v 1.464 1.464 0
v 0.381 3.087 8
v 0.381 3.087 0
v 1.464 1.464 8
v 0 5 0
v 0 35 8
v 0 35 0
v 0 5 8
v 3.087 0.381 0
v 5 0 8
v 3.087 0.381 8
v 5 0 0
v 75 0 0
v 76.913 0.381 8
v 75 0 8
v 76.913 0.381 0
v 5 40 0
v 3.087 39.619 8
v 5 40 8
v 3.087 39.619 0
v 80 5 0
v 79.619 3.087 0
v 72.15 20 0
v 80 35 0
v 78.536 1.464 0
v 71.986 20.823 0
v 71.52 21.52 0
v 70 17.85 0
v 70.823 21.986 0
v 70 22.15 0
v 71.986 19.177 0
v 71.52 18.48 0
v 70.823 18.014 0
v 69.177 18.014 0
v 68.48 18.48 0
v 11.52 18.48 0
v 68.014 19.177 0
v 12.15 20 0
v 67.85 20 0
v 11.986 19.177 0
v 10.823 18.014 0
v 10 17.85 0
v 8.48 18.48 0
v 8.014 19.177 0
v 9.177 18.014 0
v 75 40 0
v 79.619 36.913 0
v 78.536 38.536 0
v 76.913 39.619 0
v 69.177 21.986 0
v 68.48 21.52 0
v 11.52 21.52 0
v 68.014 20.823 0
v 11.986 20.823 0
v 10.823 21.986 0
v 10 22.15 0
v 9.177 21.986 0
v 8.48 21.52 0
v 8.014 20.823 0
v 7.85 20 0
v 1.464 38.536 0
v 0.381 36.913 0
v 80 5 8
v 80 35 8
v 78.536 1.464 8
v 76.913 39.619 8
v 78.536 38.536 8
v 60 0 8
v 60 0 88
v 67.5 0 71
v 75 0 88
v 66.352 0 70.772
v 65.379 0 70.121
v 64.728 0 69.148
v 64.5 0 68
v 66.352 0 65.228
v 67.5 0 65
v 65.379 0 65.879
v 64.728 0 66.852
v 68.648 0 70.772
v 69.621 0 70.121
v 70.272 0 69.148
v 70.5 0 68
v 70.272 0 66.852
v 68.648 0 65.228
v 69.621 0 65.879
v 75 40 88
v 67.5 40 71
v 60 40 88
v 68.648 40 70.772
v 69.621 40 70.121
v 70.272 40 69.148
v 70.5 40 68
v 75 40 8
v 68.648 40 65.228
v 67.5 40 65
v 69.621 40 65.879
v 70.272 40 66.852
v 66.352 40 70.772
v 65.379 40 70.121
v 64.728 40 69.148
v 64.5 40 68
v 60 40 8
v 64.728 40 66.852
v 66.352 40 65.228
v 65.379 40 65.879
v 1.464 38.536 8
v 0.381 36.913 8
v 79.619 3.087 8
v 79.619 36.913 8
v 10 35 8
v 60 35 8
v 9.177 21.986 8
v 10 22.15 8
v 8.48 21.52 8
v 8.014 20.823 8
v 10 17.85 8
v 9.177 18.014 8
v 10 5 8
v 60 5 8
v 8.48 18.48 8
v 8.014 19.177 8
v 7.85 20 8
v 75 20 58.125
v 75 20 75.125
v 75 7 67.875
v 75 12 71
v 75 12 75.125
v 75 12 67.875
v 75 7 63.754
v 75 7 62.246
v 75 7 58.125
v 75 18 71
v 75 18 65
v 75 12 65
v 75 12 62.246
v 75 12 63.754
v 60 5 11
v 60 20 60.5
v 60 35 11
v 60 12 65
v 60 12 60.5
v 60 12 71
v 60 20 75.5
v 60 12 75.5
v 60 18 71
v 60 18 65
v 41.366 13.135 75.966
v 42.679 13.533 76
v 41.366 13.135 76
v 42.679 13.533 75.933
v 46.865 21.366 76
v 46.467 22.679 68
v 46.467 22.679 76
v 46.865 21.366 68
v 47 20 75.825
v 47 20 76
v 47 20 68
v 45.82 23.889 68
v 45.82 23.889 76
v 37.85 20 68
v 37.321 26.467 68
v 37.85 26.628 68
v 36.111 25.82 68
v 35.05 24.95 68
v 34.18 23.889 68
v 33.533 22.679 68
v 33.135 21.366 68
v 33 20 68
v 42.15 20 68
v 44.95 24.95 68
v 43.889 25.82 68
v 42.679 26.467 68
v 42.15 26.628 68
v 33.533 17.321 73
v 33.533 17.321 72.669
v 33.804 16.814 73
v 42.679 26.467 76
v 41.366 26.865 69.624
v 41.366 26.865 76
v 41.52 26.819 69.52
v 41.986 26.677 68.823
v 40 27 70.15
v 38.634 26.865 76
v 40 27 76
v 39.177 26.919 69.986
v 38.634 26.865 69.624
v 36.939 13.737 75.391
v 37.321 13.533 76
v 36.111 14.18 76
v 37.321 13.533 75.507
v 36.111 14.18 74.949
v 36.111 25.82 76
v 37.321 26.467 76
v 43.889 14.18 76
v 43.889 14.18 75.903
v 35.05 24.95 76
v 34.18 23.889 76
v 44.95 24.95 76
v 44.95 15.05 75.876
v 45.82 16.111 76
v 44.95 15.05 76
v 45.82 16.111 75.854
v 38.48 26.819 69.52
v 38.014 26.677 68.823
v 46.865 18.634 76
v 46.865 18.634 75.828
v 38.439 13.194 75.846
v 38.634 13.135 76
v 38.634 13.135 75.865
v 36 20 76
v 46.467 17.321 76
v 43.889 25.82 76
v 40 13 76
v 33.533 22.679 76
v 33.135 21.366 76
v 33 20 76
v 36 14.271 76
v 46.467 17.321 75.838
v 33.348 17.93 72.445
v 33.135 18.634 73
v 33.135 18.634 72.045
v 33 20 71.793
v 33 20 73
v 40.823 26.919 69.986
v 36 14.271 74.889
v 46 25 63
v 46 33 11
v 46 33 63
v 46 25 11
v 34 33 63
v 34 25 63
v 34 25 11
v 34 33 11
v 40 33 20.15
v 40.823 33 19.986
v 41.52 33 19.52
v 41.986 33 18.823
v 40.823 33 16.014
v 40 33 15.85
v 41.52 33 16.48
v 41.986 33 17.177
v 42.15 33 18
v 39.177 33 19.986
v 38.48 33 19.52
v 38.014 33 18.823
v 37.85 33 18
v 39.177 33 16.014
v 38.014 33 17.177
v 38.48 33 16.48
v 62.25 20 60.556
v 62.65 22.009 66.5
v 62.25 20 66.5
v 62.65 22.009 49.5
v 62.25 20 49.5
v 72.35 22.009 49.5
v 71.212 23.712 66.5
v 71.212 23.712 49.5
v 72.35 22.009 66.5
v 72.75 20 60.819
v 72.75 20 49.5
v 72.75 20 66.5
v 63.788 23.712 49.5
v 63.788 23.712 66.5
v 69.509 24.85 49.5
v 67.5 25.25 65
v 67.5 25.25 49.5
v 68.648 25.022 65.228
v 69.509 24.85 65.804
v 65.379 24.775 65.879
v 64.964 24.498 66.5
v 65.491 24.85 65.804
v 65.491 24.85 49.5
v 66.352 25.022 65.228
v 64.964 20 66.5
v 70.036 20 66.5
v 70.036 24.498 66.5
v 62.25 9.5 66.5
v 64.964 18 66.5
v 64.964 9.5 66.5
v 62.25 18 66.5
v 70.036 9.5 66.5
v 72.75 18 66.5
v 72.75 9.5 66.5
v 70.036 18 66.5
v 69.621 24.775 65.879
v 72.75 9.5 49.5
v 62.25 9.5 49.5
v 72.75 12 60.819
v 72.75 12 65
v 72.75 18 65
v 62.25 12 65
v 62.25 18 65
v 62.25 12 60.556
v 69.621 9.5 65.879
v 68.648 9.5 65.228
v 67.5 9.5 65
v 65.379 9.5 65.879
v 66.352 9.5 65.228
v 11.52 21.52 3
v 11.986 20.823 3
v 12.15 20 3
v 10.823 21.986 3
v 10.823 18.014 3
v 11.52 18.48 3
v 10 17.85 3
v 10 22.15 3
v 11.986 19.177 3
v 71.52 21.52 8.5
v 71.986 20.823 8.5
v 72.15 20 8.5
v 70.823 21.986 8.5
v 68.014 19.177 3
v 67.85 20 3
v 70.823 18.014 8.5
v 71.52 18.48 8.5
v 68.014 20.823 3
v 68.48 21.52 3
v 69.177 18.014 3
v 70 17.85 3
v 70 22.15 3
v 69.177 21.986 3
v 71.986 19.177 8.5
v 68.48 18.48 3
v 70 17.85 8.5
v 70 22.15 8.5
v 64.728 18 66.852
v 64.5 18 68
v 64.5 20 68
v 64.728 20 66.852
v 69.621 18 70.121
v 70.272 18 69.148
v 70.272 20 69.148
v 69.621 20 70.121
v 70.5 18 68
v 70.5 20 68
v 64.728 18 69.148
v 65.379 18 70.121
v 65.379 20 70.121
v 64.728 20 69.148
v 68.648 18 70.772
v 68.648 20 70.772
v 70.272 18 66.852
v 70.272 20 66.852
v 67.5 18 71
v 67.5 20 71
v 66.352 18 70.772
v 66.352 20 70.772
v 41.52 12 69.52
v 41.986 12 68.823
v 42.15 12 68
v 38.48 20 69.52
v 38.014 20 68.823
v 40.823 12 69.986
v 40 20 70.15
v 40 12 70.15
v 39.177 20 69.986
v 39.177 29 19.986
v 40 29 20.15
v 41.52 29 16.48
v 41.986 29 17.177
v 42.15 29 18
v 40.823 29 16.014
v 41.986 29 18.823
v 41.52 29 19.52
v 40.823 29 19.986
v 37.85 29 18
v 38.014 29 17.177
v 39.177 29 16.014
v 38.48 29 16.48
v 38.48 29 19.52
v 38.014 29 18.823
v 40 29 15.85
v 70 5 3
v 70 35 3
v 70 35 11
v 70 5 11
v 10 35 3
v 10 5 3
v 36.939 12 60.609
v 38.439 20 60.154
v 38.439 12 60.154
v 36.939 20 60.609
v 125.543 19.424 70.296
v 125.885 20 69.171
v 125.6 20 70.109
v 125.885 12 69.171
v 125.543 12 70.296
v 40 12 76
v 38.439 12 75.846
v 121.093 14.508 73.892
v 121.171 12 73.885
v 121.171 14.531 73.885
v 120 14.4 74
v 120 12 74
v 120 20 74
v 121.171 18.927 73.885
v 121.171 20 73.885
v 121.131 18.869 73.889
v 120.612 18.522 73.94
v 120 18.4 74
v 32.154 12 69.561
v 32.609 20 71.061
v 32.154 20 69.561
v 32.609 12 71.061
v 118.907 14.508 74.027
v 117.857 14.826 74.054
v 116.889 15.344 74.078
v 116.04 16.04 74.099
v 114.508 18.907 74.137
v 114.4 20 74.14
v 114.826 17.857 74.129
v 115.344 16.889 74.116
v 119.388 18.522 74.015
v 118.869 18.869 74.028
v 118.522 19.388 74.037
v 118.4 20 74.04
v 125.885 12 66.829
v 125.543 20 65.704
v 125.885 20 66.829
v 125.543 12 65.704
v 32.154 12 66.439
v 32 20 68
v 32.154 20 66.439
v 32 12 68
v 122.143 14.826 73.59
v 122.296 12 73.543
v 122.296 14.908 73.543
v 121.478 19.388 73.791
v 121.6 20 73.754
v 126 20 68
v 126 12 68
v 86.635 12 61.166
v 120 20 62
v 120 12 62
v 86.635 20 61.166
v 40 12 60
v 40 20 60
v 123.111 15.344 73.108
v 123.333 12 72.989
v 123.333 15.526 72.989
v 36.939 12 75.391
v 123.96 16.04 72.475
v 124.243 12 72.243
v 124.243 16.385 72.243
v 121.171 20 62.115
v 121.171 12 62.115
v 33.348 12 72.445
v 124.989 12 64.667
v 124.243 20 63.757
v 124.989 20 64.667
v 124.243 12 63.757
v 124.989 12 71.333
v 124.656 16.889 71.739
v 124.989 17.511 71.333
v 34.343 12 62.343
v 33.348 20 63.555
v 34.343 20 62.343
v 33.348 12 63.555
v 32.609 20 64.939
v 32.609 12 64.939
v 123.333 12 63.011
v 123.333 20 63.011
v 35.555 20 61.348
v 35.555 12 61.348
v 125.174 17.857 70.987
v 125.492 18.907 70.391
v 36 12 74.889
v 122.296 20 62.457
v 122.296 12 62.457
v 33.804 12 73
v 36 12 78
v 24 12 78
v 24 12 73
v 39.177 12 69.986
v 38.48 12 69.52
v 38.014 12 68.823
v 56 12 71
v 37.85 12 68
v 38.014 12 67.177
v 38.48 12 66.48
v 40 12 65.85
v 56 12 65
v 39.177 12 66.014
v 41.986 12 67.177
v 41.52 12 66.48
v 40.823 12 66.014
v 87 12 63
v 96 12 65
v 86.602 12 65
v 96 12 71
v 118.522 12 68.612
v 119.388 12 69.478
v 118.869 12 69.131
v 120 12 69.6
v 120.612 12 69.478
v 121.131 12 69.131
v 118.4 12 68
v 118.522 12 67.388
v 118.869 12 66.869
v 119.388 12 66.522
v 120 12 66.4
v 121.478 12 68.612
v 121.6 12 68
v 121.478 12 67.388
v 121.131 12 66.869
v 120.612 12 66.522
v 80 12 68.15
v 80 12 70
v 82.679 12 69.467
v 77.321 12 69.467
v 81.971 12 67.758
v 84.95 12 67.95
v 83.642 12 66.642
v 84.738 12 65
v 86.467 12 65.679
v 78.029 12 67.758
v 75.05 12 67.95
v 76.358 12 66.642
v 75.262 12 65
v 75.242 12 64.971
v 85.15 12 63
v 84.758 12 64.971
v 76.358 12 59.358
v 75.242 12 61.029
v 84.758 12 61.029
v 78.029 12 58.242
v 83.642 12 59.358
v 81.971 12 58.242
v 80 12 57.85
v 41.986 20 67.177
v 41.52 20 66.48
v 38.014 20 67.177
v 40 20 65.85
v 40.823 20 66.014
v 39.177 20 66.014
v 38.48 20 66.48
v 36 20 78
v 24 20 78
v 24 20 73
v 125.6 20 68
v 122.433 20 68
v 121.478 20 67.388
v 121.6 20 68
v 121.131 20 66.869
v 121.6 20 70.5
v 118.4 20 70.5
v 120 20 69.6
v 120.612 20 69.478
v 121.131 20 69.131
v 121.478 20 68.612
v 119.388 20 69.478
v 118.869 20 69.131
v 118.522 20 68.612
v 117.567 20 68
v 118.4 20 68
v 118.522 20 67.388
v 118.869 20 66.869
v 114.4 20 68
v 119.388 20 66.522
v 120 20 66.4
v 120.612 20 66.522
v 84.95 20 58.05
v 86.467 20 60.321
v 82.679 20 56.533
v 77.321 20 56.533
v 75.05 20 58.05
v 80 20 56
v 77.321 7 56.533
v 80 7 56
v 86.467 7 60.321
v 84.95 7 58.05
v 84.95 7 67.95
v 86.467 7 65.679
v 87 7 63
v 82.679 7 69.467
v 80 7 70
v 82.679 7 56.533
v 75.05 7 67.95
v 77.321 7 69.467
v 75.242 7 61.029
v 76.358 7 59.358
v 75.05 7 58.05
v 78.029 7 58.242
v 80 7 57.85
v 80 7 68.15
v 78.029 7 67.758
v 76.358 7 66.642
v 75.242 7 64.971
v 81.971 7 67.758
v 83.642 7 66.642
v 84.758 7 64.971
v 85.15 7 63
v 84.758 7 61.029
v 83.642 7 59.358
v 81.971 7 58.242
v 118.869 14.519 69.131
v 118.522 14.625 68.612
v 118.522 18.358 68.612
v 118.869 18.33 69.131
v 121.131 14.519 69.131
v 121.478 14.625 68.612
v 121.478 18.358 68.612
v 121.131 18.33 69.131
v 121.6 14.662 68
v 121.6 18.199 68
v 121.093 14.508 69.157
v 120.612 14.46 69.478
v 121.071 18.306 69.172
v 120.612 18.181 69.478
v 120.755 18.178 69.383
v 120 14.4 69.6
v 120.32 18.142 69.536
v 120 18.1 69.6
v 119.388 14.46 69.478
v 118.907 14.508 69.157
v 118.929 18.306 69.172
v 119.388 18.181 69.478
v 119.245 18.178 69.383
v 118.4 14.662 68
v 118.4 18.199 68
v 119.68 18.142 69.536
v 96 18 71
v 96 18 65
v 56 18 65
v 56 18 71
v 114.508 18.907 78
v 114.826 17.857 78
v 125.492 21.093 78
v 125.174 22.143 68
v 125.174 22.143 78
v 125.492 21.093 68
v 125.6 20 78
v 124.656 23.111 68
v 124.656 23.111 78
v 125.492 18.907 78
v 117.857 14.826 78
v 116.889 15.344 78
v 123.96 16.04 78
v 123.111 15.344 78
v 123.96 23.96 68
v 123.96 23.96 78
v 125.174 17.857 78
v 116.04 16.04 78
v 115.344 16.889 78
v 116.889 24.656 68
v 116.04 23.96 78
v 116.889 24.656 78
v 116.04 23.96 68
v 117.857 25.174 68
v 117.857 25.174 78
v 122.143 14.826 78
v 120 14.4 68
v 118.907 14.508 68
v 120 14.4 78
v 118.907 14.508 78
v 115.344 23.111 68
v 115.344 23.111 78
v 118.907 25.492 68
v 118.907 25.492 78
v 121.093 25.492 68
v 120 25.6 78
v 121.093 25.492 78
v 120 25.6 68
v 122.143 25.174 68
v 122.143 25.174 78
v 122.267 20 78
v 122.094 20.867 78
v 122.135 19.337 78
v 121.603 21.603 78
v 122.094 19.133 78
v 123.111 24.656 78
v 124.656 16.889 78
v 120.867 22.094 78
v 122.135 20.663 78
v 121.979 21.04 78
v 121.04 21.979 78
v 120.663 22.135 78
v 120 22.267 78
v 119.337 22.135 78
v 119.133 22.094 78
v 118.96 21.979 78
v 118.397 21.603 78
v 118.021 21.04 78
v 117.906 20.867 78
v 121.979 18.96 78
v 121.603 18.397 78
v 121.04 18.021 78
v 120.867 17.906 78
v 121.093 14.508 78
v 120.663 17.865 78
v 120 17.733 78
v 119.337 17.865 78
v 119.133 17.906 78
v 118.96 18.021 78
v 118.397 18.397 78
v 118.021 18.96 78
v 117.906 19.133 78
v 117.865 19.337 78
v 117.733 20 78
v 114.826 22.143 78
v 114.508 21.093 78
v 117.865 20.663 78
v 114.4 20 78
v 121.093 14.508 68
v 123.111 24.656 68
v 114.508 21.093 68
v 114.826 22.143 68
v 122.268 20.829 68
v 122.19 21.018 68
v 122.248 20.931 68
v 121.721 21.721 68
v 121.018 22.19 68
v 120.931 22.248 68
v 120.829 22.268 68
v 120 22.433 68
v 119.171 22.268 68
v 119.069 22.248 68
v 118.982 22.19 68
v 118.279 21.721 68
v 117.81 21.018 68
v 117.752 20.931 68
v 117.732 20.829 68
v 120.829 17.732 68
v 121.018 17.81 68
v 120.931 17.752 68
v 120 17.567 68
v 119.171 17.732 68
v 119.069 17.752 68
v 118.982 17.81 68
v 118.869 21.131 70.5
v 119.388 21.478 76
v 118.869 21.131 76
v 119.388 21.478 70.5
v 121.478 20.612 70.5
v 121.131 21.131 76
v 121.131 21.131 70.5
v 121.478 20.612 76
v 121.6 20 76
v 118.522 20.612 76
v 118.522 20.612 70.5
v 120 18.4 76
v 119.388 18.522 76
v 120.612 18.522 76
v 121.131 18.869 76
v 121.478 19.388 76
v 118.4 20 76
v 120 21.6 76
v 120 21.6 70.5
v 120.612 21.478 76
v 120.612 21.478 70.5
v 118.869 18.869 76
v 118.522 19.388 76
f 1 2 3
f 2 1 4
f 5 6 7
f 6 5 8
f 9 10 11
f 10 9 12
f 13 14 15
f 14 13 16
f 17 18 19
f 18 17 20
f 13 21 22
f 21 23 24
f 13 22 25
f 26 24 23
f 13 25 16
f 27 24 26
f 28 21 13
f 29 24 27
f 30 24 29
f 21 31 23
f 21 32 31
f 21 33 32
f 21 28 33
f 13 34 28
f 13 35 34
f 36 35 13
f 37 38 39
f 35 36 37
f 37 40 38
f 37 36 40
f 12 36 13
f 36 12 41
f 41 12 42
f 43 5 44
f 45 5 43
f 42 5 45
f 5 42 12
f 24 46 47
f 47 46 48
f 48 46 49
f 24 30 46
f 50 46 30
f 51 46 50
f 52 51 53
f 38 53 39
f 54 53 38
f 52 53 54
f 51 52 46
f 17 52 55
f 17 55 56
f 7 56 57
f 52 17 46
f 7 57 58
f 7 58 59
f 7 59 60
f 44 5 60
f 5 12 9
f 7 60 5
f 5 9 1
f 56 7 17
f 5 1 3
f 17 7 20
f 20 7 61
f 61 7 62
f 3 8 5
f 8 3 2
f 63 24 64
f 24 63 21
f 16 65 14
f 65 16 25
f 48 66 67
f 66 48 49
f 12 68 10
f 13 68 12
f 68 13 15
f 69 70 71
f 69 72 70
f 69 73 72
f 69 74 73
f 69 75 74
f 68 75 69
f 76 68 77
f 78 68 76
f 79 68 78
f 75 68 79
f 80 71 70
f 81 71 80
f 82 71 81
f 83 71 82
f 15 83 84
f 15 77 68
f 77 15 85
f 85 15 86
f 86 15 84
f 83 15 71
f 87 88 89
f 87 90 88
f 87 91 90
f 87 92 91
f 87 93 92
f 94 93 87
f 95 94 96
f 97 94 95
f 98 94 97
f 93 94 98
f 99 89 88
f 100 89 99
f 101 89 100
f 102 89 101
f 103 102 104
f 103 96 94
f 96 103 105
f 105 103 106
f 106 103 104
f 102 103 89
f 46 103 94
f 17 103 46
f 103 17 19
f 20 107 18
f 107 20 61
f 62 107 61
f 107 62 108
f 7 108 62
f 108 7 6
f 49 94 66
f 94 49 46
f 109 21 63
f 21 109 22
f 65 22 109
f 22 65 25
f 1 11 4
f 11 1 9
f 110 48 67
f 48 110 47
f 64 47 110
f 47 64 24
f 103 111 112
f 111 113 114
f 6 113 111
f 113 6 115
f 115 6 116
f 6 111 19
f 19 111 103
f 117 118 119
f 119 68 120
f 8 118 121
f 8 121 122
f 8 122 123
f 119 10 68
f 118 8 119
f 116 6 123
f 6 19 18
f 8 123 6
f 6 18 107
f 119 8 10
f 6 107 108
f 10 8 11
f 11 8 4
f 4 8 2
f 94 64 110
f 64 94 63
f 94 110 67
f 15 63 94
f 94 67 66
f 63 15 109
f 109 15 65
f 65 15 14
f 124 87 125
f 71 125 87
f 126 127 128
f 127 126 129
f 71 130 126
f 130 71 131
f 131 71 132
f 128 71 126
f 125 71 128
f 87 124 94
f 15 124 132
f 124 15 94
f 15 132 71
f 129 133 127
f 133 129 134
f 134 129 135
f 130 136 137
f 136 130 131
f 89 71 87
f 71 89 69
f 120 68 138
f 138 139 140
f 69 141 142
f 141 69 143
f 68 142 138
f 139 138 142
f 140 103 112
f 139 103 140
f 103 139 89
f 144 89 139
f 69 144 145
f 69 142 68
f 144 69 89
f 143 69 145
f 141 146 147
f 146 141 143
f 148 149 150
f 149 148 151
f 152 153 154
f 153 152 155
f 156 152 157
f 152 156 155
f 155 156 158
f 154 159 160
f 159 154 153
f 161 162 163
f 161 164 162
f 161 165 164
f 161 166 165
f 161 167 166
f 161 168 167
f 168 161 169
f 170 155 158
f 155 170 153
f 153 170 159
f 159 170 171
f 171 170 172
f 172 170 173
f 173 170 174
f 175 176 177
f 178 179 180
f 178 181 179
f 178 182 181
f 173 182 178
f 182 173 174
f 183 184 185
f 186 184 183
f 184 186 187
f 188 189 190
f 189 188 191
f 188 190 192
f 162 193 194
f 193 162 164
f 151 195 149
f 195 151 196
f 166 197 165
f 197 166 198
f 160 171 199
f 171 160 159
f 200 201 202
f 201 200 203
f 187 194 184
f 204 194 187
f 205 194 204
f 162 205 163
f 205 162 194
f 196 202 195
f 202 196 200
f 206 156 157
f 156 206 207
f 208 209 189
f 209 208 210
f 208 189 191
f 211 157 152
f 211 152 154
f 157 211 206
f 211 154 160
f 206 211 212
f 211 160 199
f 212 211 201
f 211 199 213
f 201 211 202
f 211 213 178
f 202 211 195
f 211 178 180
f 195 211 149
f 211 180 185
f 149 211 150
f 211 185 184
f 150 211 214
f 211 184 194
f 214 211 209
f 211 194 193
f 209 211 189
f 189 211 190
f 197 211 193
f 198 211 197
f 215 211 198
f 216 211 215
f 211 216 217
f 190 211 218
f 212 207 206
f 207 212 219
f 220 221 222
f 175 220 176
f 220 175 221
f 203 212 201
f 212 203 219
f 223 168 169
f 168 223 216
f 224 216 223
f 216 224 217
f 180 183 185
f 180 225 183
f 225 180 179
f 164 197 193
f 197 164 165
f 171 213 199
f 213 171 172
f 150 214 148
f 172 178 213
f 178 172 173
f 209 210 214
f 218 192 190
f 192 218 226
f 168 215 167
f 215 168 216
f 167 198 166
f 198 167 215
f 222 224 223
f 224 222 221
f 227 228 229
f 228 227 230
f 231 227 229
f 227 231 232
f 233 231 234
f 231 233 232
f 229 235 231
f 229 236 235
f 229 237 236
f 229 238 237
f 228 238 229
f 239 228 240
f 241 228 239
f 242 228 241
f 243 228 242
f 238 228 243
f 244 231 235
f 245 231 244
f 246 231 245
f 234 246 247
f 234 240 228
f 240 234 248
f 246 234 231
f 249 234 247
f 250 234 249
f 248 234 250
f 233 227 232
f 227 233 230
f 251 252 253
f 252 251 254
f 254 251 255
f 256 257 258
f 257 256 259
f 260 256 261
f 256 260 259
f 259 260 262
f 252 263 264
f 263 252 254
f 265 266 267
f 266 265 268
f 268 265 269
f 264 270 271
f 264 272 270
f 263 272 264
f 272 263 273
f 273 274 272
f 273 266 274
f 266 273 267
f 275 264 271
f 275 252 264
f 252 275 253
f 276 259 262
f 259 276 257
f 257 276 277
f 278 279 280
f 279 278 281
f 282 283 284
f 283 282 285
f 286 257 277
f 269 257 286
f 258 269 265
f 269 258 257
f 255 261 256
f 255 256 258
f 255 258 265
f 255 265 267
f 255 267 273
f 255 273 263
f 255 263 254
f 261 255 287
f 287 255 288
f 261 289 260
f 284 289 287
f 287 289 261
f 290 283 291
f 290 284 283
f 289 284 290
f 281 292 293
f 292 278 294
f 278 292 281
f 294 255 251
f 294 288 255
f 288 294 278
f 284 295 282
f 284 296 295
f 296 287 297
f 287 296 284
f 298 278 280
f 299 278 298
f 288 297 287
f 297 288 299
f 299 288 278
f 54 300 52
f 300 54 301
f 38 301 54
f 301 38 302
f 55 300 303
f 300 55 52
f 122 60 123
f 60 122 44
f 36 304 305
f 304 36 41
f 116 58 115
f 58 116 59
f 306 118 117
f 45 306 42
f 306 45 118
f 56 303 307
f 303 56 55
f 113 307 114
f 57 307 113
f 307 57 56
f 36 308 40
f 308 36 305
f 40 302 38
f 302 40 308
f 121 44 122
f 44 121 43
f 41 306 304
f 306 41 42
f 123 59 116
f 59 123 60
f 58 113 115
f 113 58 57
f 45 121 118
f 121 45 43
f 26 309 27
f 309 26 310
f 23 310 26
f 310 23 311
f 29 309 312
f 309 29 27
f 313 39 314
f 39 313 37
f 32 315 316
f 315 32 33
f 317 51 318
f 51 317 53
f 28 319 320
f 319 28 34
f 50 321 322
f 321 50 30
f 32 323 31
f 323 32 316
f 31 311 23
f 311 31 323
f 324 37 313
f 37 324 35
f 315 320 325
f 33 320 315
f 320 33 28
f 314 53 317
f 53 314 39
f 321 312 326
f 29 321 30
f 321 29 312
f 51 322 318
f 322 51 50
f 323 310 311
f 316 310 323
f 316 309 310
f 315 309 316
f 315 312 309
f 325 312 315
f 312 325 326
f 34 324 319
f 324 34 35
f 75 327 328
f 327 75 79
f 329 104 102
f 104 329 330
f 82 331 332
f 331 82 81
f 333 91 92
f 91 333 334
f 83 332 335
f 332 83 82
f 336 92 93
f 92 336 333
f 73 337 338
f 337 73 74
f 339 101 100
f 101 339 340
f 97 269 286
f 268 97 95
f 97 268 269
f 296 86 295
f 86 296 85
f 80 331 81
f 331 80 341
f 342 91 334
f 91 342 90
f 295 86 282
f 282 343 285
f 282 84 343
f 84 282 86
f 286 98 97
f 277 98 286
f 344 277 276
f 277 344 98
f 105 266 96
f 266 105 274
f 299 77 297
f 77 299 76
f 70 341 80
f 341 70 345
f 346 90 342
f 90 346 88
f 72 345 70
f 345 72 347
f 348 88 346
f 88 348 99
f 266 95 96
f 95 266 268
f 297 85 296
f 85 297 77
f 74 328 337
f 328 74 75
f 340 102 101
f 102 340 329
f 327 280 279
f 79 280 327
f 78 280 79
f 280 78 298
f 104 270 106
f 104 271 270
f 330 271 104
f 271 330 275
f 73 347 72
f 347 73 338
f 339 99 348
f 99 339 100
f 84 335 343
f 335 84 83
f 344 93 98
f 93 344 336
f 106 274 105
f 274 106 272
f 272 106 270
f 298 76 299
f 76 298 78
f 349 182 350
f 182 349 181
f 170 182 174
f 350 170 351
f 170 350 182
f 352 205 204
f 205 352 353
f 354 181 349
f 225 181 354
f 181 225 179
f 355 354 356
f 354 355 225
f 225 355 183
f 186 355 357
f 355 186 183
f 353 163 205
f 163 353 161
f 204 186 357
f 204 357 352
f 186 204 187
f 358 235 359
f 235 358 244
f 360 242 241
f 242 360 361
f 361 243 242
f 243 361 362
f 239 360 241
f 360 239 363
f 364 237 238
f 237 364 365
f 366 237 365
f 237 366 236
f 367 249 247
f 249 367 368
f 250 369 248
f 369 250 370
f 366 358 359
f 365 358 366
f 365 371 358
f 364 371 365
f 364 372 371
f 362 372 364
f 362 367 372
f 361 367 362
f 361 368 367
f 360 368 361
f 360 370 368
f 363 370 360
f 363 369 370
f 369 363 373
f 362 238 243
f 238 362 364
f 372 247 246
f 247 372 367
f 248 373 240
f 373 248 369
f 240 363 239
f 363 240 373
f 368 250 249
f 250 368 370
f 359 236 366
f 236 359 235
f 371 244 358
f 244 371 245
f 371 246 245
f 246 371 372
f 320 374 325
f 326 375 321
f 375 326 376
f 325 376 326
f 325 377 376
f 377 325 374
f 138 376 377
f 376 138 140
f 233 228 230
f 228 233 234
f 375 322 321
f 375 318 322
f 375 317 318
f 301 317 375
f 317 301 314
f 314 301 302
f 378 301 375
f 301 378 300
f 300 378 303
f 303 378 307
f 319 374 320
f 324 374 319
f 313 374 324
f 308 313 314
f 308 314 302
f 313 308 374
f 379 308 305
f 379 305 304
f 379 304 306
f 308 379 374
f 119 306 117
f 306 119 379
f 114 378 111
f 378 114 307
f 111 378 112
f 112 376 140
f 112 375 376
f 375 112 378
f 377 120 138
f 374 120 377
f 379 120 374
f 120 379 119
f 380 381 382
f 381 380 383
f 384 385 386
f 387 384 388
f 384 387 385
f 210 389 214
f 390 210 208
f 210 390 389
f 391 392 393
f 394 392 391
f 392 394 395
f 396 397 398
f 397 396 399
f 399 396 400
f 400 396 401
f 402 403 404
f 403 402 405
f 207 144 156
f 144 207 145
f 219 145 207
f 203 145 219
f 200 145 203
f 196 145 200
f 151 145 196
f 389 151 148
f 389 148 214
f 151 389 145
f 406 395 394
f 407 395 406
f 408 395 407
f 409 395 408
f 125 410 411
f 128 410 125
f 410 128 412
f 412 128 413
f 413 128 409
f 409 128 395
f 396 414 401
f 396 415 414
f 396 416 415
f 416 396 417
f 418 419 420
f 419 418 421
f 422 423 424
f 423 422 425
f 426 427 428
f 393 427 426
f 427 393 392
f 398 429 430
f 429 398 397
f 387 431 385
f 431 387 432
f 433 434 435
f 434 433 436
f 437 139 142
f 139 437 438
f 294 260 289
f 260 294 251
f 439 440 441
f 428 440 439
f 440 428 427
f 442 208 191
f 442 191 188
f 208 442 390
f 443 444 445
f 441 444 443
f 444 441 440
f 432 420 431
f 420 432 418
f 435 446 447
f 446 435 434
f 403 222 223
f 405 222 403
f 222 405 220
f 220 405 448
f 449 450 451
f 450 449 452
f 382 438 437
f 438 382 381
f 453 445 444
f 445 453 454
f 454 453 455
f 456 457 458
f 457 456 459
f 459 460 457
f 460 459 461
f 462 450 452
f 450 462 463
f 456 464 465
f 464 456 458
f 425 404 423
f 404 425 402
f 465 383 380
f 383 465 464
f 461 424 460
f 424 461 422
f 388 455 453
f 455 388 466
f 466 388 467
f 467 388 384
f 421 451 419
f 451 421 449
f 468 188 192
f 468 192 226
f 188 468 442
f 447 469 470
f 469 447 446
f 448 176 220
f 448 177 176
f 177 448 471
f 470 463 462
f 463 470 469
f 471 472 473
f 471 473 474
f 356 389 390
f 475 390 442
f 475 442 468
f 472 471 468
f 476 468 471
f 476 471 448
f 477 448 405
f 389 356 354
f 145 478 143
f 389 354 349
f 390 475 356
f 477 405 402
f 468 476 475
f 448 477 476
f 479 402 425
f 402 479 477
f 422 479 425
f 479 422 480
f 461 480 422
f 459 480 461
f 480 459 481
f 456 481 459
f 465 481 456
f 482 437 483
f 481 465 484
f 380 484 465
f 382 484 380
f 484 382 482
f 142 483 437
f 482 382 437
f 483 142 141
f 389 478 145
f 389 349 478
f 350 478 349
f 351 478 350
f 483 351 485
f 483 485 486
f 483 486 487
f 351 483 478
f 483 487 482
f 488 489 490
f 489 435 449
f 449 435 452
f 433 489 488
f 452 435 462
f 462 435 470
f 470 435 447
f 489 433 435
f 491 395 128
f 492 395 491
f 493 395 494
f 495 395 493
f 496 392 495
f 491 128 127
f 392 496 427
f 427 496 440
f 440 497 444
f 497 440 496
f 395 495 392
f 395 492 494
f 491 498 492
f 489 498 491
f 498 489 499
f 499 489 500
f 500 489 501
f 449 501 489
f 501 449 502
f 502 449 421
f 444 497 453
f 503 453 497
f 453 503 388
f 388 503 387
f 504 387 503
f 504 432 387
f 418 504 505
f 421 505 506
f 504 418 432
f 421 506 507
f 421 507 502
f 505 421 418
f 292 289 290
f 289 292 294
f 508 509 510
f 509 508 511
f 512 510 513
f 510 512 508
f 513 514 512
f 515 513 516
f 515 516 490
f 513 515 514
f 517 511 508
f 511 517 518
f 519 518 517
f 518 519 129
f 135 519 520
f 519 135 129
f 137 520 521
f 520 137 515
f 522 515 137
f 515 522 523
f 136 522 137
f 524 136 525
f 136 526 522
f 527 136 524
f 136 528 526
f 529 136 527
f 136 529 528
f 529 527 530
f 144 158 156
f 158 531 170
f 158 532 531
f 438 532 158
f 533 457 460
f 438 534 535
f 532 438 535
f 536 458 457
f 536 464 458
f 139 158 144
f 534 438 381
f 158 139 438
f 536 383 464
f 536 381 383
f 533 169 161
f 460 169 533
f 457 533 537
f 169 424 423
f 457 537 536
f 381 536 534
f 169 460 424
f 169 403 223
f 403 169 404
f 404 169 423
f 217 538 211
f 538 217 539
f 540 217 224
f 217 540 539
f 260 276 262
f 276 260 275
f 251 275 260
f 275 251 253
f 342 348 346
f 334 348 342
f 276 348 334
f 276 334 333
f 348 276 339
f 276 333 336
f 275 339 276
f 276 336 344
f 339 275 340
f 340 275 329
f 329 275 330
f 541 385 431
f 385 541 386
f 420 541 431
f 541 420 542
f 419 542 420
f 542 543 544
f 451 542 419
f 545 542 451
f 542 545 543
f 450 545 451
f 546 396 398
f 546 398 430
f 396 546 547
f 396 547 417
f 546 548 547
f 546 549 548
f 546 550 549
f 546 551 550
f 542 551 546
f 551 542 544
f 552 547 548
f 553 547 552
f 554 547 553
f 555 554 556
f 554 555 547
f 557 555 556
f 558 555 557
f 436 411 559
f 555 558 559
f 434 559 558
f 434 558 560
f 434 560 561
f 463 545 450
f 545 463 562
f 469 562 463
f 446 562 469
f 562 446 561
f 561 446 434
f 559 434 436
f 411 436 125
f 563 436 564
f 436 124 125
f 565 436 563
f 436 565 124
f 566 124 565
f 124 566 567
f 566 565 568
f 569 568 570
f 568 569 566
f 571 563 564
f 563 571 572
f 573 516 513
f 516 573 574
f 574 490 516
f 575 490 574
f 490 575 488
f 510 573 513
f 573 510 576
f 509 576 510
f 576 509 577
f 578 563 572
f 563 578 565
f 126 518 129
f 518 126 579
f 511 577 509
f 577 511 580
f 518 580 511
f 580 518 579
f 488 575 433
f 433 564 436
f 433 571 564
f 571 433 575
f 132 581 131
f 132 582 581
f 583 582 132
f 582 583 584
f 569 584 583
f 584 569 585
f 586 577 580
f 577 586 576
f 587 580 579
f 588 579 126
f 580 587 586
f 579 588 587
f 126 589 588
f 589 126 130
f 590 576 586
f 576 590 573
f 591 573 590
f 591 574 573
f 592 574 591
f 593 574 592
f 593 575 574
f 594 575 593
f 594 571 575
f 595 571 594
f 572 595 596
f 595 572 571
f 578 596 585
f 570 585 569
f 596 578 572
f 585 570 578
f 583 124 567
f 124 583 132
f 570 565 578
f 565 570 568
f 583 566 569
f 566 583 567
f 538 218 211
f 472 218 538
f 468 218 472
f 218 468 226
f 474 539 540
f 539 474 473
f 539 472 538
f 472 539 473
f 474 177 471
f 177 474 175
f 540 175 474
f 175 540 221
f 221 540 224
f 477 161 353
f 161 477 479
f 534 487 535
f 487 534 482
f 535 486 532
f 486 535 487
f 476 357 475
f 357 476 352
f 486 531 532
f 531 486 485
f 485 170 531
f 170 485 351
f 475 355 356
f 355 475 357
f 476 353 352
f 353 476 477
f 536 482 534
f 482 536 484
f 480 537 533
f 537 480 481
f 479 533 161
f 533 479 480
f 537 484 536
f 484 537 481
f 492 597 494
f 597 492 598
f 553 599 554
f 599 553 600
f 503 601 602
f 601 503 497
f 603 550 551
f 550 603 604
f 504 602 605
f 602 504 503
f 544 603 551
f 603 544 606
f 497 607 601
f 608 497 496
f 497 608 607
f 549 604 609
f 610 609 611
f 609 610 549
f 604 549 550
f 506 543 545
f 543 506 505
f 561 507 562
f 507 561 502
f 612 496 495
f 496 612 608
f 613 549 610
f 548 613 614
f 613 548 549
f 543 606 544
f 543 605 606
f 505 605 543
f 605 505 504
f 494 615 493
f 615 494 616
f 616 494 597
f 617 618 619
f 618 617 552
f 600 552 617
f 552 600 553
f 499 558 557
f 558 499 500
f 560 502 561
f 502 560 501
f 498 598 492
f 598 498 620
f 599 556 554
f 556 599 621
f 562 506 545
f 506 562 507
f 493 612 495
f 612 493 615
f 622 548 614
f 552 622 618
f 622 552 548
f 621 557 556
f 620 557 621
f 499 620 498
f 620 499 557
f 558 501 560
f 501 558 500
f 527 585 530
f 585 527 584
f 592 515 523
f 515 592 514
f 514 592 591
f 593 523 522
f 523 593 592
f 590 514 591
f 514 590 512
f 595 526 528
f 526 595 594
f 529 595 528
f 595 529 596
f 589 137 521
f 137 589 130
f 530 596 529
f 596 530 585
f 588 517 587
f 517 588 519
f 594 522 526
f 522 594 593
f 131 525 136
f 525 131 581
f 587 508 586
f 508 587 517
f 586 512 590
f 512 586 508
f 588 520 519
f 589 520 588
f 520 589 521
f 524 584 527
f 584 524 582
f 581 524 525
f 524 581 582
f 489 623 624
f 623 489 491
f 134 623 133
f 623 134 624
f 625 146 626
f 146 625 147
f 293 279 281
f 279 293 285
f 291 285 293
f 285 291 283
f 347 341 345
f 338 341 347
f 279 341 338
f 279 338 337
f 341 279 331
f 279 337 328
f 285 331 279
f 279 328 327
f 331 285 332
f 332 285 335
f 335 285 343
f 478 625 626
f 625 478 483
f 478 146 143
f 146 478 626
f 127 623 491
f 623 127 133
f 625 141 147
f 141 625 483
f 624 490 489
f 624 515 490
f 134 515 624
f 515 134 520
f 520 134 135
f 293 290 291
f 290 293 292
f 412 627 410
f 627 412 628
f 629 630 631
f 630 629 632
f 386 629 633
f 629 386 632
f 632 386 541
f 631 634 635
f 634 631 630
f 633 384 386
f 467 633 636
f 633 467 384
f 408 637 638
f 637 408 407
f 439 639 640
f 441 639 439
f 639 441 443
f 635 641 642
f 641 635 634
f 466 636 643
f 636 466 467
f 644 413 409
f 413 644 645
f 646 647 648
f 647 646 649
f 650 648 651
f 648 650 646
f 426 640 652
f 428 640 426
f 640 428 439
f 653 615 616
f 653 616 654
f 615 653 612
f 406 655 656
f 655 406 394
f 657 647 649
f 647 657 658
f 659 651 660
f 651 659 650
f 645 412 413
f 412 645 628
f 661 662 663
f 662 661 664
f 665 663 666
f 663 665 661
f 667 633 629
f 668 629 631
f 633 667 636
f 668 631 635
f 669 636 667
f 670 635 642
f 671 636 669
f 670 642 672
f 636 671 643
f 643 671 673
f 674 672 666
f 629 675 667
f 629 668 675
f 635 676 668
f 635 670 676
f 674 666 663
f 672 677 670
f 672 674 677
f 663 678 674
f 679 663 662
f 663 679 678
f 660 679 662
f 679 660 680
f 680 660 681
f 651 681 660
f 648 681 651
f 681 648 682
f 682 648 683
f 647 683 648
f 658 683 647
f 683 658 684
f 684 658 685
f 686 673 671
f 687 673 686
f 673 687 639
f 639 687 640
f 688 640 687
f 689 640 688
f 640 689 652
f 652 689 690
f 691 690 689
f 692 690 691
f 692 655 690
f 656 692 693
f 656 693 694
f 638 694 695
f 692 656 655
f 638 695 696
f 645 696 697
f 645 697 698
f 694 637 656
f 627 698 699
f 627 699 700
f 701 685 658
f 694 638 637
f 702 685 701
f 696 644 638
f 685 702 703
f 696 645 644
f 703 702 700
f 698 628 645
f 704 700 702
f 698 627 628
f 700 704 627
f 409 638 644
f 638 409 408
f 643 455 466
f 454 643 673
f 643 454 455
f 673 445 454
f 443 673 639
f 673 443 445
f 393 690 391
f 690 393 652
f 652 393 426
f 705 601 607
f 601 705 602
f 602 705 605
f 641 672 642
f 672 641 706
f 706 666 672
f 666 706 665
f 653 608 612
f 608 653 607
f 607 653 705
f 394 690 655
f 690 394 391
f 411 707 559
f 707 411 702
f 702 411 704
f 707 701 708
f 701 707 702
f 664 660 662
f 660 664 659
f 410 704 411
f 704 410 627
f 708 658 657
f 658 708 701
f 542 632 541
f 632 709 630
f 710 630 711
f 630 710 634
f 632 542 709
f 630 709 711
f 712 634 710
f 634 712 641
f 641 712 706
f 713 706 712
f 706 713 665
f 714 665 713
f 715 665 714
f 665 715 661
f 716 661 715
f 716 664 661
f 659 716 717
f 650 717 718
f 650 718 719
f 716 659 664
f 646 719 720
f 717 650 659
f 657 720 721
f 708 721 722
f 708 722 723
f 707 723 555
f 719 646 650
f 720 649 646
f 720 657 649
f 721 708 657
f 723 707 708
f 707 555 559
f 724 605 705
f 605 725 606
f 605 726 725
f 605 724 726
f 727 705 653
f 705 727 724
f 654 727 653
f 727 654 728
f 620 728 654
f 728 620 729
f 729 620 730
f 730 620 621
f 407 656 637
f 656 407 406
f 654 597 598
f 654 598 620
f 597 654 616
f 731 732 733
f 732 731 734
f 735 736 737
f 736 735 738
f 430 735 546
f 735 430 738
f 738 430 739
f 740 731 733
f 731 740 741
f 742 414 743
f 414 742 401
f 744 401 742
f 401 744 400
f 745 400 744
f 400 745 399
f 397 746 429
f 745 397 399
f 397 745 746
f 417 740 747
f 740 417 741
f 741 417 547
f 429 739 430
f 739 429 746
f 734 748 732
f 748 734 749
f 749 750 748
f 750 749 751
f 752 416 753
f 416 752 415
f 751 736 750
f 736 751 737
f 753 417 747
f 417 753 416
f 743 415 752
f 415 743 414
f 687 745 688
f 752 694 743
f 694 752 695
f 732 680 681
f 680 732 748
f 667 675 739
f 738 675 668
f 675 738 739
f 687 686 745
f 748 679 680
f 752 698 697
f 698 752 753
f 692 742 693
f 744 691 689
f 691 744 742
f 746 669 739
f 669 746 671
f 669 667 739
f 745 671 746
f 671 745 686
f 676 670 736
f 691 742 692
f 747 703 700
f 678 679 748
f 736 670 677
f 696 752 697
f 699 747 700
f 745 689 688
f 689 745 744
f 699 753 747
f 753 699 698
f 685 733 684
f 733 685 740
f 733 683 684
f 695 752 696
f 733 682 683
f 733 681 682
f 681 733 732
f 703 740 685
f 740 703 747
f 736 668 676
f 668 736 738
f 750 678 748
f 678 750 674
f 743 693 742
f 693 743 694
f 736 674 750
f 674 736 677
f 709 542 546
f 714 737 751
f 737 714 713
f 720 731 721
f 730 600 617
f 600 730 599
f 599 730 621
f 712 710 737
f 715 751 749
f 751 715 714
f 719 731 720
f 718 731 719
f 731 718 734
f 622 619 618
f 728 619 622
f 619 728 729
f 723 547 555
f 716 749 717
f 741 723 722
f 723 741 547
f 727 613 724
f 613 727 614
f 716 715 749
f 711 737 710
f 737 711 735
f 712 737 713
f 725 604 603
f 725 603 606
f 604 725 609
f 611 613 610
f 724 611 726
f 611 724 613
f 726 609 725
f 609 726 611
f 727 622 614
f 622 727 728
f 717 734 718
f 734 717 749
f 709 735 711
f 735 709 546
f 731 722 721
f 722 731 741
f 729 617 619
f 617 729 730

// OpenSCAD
/**
 * wire_tensioner.scad — TM-CWND-001 Rev A
 * Wire Tensioner and Feed Guide Assembly
 *
 * Maintains consistent wire tension from spool to coil former.
 * Prevents wire loops, kinks, and variable turn spacing.
 *
 * Three modules:
 *   1. tensioner_base()  — Mounts to machine frame, holds spool post + tensioner
 *   2. tensioner_arm()   — Spring-loaded lever, adjustable tension
 *   3. wire_guide_eye()  — Ceramic or PTFE guide eyelet (or print with smooth bore)
 *
 * Design philosophy:
 *   - Spring-loaded arm with adjustable preload
 *   - Wire path: spool → post guide → tensioner arm → wire guide carriage
 *   - Tension controlled by spring preload bolt
 *   - Wire break detection when arm swings to zero-tension limit
 *   - Supports AWG 10 (2.6mm) to AWG 30 (0.3mm) with appropriate eyelet size
 *
 * Print settings:
 *   Material: PETG
 *   Infill: 50%
 *   Wall: 3 perimeters
 *   Layer: 0.2mm
 *   Print envelope: 180×80×60mm (all parts fit together)
 *
 * Hardware:
 *   Spring: 10mm OD, 40mm free length, ~0.5N/mm (McMaster 9657K113 or similar)
 *   Eyelet: 3mm bore (AWG 10–16), 1.5mm bore (AWG 17–30)
 *   Pivot: M4×25mm bolt + flanged bearing F624ZZ (4mm bore, 13mm OD)
 *   Tension adjustment: M4 thumbscrew × 1
 */

// ─── Parameters ───────────────────────────────────────────────────────────────

// Base plate
base_w          = 80.0;
base_d          = 40.0;
base_h          = 8.0;
base_corner_r   = 5.0;

// Vertical post (supports spool axle + guide)
post_h          = 80.0;
post_w          = 15.0;
post_d          = base_d;
post_x          = base_w - post_w/2 - 5;

// Spool post hole (accommodates standard spool 10mm axle hole)
spool_axle_dia  = 10.5;  // 10mm axle + clearance
spool_height    = 50.0;  // Height on post where spool axle mounts

// Tensioner arm pivot
pivot_h         = 60.0;  // Height above base
pivot_x         = base_w/2;
pivot_dia       = 4.0;   // M4 pivot bolt
pivot_boss_od   = 14.0;  // Bearing/boss OD
pivot_boss_h    = 8.0;

// Tensioner arm body
arm_len         = 80.0;
arm_w           = 10.0;
arm_h           = 8.0;

// Wire eye on arm
arm_eye_x       = arm_len - 10;  // Distance from pivot to eye center
arm_eye_dia     = 3.2;           // Wire passage hole (3mm + clearance)
arm_eye_boss_od = 12.0;

// Spring seat
spring_seat_od  = 10.0;
spring_seat_d   = 5.0;   // Pocket depth
spring_x        = arm_len / 2;  // Position along arm

// Zero-tension stop (wire break detection switch contact)
stop_h          = 5.0;
stop_w          = 12.0;

// Tension adjuster (thumbscrew compresses spring)
adj_hole_dia    = 4.3;   // M4 clearance hole
adj_x           = pivot_x;
adj_base_y      = base_d - 15;

// Base mounting holes (2× M4 to machine frame)
mount_hole_dia  = 4.3;
mount_hole_sp   = base_w - 20;

// Lower wire guide (fixed post)
lower_guide_h   = post_h - 20;
lower_guide_dia = 6.0;   // Round post, smooth bore groove

// ─── Modules ──────────────────────────────────────────────────────────────────

module tensioner_base() {
    difference() {
        union() {
            // Base footprint
            hull() {
                for (x=[base_corner_r, base_w-base_corner_r])
                for (y=[base_corner_r, base_d-base_corner_r])
                    translate([x, y, 0])
                        cylinder(h=base_h, r=base_corner_r, $fn=16);
            }

            // Vertical post (back of base)
            translate([post_x-post_w/2, 0, 0])
                cube([post_w, post_d, post_h + base_h]);

            // Pivot support boss
            translate([pivot_x, base_d/2, base_h + pivot_h])
                cylinder(h=pivot_boss_h, d=pivot_boss_od, $fn=32);

            // Tension adjuster tower
            translate([adj_x-6, adj_base_y, base_h])
                cube([12, 8, pivot_h - 5]);
        }

        // Spool axle slot on vertical post (slotted for easy spool loading)
        translate([post_x, base_d/2, base_h + spool_height]) {
            cylinder(h=post_w+2, d=spool_axle_dia, $fn=16, center=true);
            // Open slot from front for easy threading
            translate([0, -spool_axle_dia/2, 0])
                cube([spool_axle_dia, spool_axle_dia, post_w+2], center=true);
        }

        // Lower wire guide hole in post
        translate([post_x, base_d/2, base_h + lower_guide_h])
            rotate([90,0,0])
                cylinder(h=post_d+1, d=lower_guide_dia, $fn=16, center=true);

        // Pivot bore
        translate([pivot_x, base_d/2, base_h + pivot_h])
        rotate([90,0,0])
            cylinder(h=base_d+1, d=pivot_dia+0.3, $fn=16, center=true);

        // Tension adjuster M4 threaded hole
        translate([adj_x, adj_base_y+4, base_h + 10])
        rotate([-90,0,0])
            cylinder(h=pivot_h, d=adj_hole_dia, $fn=16);

        // Base mounting holes
        for (x=[10, base_w-10])
            translate([x, base_d/2, -0.5])
                cylinder(h=base_h+1, d=mount_hole_dia, $fn=16);

        // Weight relief
        translate([10, 5, 3])
            cube([base_w-20, base_d-10, base_h]);
    }
}

module tensioner_arm() {
    difference() {
        union() {
            // Arm body
            hull() {
                cylinder(h=arm_h, d=pivot_boss_od+2, $fn=32);
                translate([arm_len, 0, 0])
                    cylinder(h=arm_h, d=arm_eye_boss_od, $fn=32);
            }
            // Spring seat boss
            translate([spring_x, -arm_w/2, 0])
                cylinder(h=arm_h + spring_seat_d, d=spring_seat_od+4, $fn=16);
            // Zero-tension stop tab (contacts limit switch)
            translate([-arm_len*0.2, arm_w/2, 0])
                cube([stop_w, stop_h, arm_h]);
        }
        // Pivot hole (center)
        translate([0, 0, -0.5])
            cylinder(h=arm_h+1, d=pivot_dia+0.3, $fn=16);

        // Wire eye
        translate([arm_len, 0, -0.5])
            cylinder(h=arm_h+1, d=arm_eye_dia, $fn=16);

        // Spring seat pocket
        translate([spring_x, -arm_w/2, arm_h])
            cylinder(h=spring_seat_d+0.5, d=spring_seat_od+0.3, $fn=16);

        // Material relief
        translate([arm_len*0.2, -arm_w/2+2, 2])
            cube([arm_len*0.5, arm_w-4, arm_h-2]);
    }
}

module wire_guide_eye(bore_dia=3.2) {
    // Small guide eyelet, print with smooth bore or install commercial ceramic insert
    // Can be printed in 0.1mm layers for smooth wire passage
    eye_od = bore_dia + 8.0;
    eye_h  = 10.0;
    difference() {
        cylinder(h=eye_h, d=eye_od, $fn=32);
        // Wire bore with gentle entry chamfers
        translate([0,0,-0.5])
            cylinder(h=eye_h+1, d=bore_dia, $fn=16);
        // Entry chamfer top
        translate([0,0,eye_h-2])
            cylinder(h=3, d1=bore_dia, d2=bore_dia+2, $fn=16);
        // Entry chamfer bottom
        translate([0,0,-0.5])
            cylinder(h=3, d1=bore_dia+2, d2=bore_dia, $fn=16);
    }
}

module spool_axle() {
    // Simple spool axle rod with end stop
    // 10mm OD × 100mm, with 15mm OD flange on one end
    union() {
        cylinder(h=100, d=10, $fn=16);
        translate([0,0,95]) cylinder(h=5, d=18, $fn=16);
    }
}

// ─── Render ───────────────────────────────────────────────────────────────────

$fn = 32;
print_part = "all";  // "base" | "arm" | "eye3" | "eye15" | "axle" | "all"

if (print_part == "base") {
    color("lightgray") tensioner_base();
} else if (print_part == "arm") {
    color("orange") tensioner_arm();
} else if (print_part == "eye3") {
    color("white") wire_guide_eye(3.2);
} else if (print_part == "eye15") {
    color("white") wire_guide_eye(1.6);
} else if (print_part == "axle") {
    color("lightblue") spool_axle();
} else {
    color("lightgray", 0.8) tensioner_base();
    color("orange", 0.8)
    translate([pivot_x, base_d/2, base_h + pivot_h])
    rotate([90,0,0])
        tensioner_arm();
    color("white")
    translate([pivot_x + arm_len, base_d/2, base_h + pivot_h])
        wire_guide_eye(3.2);
}

// ─── Notes ────────────────────────────────────────────────────────────────────
// WIRE PATH (front view):
//   Spool (on post axle slot)
//     ↓ (over lower guide post)
//     ↓ (through tensioner arm eye)
//     ↓ → to wire guide carriage
//
// TENSION ADJUSTMENT:
//   Turn thumb screw CW → compresses spring → increases tension
//   Start with minimum tension (just enough to prevent wire sag)
//   Heavy wire (AWG10): ~3–5N, Fine wire (AWG24+): 0.3–0.5N
//   Too much tension: wire breaks or stretches (especially for fine magnet wire)
//   Too little tension: uneven winding, wire falls off
//
// WIRE BREAK DETECTION:
//   When wire breaks, tension disappears, spring swings arm to high position
//   Limit micro-switch at high arm position → firmware FAULT: WIRE_BREAK
//   Mount SS-5GL micro-switch with roller lever at top of swing arc
